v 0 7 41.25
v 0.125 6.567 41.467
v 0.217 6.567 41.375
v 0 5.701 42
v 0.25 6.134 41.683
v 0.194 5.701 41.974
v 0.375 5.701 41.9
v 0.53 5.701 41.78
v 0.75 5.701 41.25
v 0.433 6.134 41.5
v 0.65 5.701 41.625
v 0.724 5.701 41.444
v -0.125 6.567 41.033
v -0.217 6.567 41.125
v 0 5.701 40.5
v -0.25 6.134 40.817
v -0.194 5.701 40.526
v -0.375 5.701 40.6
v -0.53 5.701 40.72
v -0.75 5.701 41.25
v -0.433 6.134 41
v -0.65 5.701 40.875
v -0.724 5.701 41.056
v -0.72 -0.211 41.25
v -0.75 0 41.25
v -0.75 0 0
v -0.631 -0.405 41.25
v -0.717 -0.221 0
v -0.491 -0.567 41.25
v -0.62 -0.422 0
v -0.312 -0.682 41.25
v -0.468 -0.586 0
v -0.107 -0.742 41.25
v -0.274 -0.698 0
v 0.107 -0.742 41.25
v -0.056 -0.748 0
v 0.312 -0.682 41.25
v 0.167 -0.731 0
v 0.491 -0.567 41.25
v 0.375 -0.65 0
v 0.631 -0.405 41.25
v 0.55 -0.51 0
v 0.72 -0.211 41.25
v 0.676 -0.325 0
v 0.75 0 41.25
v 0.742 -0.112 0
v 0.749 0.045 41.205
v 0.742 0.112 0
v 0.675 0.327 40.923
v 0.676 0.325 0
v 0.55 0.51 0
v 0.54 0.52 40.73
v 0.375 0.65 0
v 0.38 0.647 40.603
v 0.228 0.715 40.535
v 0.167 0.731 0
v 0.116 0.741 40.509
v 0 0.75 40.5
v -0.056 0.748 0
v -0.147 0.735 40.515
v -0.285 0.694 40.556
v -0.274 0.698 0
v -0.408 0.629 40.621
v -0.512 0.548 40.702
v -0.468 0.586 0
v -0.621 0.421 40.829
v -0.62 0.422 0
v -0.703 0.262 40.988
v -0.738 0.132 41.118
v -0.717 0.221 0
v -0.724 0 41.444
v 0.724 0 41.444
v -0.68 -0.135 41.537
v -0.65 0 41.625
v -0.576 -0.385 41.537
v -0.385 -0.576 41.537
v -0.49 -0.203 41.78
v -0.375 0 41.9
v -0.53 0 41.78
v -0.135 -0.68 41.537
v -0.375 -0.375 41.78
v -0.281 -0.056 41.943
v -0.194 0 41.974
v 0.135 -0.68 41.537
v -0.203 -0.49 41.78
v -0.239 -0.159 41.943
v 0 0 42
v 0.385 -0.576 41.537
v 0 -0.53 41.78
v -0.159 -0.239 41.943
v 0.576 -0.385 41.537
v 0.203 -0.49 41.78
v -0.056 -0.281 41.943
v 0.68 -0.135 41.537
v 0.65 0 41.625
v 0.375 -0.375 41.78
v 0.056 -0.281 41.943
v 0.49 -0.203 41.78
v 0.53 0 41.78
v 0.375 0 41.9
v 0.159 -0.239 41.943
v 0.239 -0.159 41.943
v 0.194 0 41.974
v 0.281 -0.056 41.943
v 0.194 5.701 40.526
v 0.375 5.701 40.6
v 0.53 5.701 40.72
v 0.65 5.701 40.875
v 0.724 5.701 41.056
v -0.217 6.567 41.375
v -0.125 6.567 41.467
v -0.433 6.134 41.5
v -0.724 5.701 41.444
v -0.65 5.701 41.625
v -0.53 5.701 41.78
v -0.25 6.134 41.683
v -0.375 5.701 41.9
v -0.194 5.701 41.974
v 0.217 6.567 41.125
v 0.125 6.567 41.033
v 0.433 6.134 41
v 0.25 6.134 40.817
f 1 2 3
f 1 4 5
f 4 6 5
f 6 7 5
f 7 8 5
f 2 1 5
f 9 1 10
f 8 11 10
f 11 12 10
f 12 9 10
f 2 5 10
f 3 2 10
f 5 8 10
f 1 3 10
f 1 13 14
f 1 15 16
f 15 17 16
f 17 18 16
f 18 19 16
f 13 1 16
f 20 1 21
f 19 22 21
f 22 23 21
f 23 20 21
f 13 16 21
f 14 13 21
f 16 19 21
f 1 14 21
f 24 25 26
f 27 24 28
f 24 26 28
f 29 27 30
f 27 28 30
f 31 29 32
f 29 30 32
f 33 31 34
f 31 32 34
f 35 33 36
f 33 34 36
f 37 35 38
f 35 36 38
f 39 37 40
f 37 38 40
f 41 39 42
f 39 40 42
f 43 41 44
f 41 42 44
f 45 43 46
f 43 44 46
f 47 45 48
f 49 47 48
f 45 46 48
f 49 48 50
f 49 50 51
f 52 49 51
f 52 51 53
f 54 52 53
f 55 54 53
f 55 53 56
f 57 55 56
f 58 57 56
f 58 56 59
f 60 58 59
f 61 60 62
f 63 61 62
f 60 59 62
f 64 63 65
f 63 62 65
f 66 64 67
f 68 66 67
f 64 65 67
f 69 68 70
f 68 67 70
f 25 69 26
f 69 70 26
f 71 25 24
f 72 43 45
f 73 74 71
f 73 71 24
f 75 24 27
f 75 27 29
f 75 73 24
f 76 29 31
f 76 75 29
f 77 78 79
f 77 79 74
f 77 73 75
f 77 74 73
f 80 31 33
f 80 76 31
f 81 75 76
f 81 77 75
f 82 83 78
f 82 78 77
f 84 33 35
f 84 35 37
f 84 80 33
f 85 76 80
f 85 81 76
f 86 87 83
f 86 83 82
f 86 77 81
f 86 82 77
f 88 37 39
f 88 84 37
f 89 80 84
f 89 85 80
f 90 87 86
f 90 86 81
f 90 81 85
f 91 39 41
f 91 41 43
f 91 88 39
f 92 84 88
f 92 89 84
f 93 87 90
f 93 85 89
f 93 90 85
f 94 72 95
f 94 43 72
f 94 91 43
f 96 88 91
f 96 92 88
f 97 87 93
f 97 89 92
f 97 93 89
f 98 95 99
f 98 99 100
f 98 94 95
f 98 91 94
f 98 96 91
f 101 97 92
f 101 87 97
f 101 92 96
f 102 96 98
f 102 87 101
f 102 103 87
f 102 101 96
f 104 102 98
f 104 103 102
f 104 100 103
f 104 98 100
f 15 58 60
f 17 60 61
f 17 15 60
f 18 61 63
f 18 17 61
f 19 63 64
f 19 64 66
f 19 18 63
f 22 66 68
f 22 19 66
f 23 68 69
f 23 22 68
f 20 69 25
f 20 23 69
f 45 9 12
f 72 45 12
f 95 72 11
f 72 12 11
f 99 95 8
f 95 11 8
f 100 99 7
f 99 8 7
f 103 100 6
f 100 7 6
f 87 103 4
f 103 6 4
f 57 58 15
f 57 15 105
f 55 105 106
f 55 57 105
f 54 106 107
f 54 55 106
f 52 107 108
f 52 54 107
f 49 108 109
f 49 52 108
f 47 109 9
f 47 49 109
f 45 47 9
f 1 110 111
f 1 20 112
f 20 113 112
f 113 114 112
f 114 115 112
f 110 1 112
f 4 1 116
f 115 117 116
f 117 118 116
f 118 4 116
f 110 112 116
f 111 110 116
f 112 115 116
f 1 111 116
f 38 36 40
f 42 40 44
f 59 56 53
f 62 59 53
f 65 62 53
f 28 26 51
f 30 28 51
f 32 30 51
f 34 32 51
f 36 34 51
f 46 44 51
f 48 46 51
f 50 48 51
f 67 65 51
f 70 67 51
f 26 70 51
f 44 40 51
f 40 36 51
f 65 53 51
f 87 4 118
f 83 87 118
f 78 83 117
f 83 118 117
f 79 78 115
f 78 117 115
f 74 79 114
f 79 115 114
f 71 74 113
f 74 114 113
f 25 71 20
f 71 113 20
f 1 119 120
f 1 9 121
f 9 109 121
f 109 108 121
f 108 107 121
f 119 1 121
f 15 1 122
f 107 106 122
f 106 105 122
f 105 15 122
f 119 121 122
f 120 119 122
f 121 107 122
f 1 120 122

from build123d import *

# Parameters (mm, degrees)
F1_DEPTH     = 42
F2_START     = 40.5
F2_DEPTH     = 1.5
F3_T1_DEPTH  = 8.875
F3_T4_ANGLE  = 180
F3_T8_DEPTH  = 10.75
F3_S9_R      = 0.75
F3_T10_DEPTH = 7
F3_T14_DEPTH = 10.75
F3_S15_R     = 0.75
F3_T16_DEPTH = 7
F4_SIZE2     = 1.299028
F4_SIZE      = 0.74999


# Not quite as in the source:
# - a fillet or chamfer that OpenCascade refuses, or shapes differently, is made with other operations: its cross-section is extruded or revolved along the edge and cut away or added
# - a fillet or chamfer is up to 0.001 mm smaller than in the source, because OpenCascade refuses the exact size


with BuildPart() as f1:
    # F0 (on Top) → F1 (new body)
    with BuildSketch(Plane.XY):
        with BuildLine():
            Line((-0.75, 0), (0.75, 0))
            ThreePointArc((0.75, 0), (0, 0.75), (-0.75, 0))
        make_face()
        with BuildLine():
            ThreePointArc((-0.75, 0), (0, -0.75), (0.75, 0))
            Line((0.75, 0), (-0.75, 0))
        make_face()
    extrude(amount=F1_DEPTH)

    # F0 (on Top) → F2 (join)
    with BuildSketch(Plane.XY.offset(F2_START)):
        with BuildLine():
            ThreePointArc((-0.75, 0), (0, 0.75), (0.75, 0))
            Line((0.75, 0), (0.75, 7))
            Line((0.75, 7), (-0.75, 7))
            Line((-0.75, 7), (-0.75, 0))
        make_face()
    extrude(amount=F2_DEPTH)

    # F3: fillet of radius 0.75 on 5 edges, made by hand

    # F3_s2 → F3_t1 (cut)
    with BuildSketch(Plane.XZ.offset(-8.875)):
        with BuildLine():
            ThreePointArc((0.75, 41.25), (0.5303300859, 41.7803300859), (0, 42))
            Line((0, 42), (0.75, 42))
            Line((0.75, 42), (0.75, 41.25))
        make_face()
        with BuildLine():
            ThreePointArc((0, 42), (-0.5303300859, 41.7803300859), (-0.75, 41.25))
            Line((-0.75, 41.25), (-0.75, 42))
            Line((-0.75, 42), (0, 42))
        make_face()
    extrude(amount=F3_T1_DEPTH, mode=Mode.SUBTRACT)

    # F3_s3 → F3_t4 (revolve, cut)
    with BuildSketch(Plane.XZ):
        with BuildLine():
            ThreePointArc((-0.75, 41.25), (-0.5303300859, 41.7803300859), (0, 42))
            Line((0, 42), (-0.75, 42))
            Line((-0.75, 42), (-0.75, 41.25))
        make_face()
    revolve(axis=Axis((0, 0, 42), (0, 0, 1)), revolution_arc=F3_T4_ANGLE, mode=Mode.SUBTRACT)


with BuildPart() as f3_tool6:
    # F3_s7 → F3_t8 (new body)
    with BuildSketch(Plane.XZ.offset(-8.875)):
        with BuildLine():
            ThreePointArc((0, 40.5), (-0.5303300859, 40.7196699141), (-0.75, 41.25))
            Line((-0.75, 41.25), (-0.75, 40.5))
            Line((-0.75, 40.5), (0, 40.5))
        make_face()
    extrude(amount=F3_T8_DEPTH)

    # F3_s9 → F3_t10 (cut, symmetric)
    with BuildSketch(Plane.XY.offset(40.9)):
        Circle(F3_S9_R)
    extrude(amount=F3_T10_DEPTH, both=True, mode=Mode.SUBTRACT)


with BuildPart() as f1_1:
    add(f1.part)

    # F3_t5: cut F3_tool6
    add(f3_tool6.part, mode=Mode.SUBTRACT)


with BuildPart() as f3_tool12:
    # F3_s13 → F3_t14 (new body)
    with BuildSketch(Plane.XZ.offset(1.875)):
        with BuildLine():
            ThreePointArc((0, 40.5), (0.5303300859, 40.7196699141), (0.75, 41.25))
            Line((0.75, 41.25), (0.75, 40.5))
            Line((0.75, 40.5), (0, 40.5))
        make_face()
    extrude(amount=-F3_T14_DEPTH)

    # F3_s15 → F3_t16 (cut, symmetric)
    with BuildSketch(Plane.XY.offset(40.9)):
        Circle(F3_S15_R)
    extrude(amount=F3_T16_DEPTH, both=True, mode=Mode.SUBTRACT)


with BuildPart() as f1_2:
    add(f1_1.part)

    # F3_t11: cut F3_tool12
    add(f3_tool12.part, mode=Mode.SUBTRACT)

    # F4 (size 0.75 and 1.2990381057 in the source; OpenCascade refuses exactly that, so slightly less here)
    f4_edges = [f1_2.edges().sort_by_distance(p)[0] for p in [
        (-0.53033, 7, 40.71967),
        (0.53033, 7, 40.71967),
        (-0.53033, 7, 41.78033),
        (0.53033, 7, 41.78033),
    ]]
    f4_side = f1_2.faces().sort_by_distance((0, 7, 41.25))[0]
    chamfer(f4_edges, length=F4_SIZE, length2=F4_SIZE2, reference=f4_side)


solid = f1_2.part
